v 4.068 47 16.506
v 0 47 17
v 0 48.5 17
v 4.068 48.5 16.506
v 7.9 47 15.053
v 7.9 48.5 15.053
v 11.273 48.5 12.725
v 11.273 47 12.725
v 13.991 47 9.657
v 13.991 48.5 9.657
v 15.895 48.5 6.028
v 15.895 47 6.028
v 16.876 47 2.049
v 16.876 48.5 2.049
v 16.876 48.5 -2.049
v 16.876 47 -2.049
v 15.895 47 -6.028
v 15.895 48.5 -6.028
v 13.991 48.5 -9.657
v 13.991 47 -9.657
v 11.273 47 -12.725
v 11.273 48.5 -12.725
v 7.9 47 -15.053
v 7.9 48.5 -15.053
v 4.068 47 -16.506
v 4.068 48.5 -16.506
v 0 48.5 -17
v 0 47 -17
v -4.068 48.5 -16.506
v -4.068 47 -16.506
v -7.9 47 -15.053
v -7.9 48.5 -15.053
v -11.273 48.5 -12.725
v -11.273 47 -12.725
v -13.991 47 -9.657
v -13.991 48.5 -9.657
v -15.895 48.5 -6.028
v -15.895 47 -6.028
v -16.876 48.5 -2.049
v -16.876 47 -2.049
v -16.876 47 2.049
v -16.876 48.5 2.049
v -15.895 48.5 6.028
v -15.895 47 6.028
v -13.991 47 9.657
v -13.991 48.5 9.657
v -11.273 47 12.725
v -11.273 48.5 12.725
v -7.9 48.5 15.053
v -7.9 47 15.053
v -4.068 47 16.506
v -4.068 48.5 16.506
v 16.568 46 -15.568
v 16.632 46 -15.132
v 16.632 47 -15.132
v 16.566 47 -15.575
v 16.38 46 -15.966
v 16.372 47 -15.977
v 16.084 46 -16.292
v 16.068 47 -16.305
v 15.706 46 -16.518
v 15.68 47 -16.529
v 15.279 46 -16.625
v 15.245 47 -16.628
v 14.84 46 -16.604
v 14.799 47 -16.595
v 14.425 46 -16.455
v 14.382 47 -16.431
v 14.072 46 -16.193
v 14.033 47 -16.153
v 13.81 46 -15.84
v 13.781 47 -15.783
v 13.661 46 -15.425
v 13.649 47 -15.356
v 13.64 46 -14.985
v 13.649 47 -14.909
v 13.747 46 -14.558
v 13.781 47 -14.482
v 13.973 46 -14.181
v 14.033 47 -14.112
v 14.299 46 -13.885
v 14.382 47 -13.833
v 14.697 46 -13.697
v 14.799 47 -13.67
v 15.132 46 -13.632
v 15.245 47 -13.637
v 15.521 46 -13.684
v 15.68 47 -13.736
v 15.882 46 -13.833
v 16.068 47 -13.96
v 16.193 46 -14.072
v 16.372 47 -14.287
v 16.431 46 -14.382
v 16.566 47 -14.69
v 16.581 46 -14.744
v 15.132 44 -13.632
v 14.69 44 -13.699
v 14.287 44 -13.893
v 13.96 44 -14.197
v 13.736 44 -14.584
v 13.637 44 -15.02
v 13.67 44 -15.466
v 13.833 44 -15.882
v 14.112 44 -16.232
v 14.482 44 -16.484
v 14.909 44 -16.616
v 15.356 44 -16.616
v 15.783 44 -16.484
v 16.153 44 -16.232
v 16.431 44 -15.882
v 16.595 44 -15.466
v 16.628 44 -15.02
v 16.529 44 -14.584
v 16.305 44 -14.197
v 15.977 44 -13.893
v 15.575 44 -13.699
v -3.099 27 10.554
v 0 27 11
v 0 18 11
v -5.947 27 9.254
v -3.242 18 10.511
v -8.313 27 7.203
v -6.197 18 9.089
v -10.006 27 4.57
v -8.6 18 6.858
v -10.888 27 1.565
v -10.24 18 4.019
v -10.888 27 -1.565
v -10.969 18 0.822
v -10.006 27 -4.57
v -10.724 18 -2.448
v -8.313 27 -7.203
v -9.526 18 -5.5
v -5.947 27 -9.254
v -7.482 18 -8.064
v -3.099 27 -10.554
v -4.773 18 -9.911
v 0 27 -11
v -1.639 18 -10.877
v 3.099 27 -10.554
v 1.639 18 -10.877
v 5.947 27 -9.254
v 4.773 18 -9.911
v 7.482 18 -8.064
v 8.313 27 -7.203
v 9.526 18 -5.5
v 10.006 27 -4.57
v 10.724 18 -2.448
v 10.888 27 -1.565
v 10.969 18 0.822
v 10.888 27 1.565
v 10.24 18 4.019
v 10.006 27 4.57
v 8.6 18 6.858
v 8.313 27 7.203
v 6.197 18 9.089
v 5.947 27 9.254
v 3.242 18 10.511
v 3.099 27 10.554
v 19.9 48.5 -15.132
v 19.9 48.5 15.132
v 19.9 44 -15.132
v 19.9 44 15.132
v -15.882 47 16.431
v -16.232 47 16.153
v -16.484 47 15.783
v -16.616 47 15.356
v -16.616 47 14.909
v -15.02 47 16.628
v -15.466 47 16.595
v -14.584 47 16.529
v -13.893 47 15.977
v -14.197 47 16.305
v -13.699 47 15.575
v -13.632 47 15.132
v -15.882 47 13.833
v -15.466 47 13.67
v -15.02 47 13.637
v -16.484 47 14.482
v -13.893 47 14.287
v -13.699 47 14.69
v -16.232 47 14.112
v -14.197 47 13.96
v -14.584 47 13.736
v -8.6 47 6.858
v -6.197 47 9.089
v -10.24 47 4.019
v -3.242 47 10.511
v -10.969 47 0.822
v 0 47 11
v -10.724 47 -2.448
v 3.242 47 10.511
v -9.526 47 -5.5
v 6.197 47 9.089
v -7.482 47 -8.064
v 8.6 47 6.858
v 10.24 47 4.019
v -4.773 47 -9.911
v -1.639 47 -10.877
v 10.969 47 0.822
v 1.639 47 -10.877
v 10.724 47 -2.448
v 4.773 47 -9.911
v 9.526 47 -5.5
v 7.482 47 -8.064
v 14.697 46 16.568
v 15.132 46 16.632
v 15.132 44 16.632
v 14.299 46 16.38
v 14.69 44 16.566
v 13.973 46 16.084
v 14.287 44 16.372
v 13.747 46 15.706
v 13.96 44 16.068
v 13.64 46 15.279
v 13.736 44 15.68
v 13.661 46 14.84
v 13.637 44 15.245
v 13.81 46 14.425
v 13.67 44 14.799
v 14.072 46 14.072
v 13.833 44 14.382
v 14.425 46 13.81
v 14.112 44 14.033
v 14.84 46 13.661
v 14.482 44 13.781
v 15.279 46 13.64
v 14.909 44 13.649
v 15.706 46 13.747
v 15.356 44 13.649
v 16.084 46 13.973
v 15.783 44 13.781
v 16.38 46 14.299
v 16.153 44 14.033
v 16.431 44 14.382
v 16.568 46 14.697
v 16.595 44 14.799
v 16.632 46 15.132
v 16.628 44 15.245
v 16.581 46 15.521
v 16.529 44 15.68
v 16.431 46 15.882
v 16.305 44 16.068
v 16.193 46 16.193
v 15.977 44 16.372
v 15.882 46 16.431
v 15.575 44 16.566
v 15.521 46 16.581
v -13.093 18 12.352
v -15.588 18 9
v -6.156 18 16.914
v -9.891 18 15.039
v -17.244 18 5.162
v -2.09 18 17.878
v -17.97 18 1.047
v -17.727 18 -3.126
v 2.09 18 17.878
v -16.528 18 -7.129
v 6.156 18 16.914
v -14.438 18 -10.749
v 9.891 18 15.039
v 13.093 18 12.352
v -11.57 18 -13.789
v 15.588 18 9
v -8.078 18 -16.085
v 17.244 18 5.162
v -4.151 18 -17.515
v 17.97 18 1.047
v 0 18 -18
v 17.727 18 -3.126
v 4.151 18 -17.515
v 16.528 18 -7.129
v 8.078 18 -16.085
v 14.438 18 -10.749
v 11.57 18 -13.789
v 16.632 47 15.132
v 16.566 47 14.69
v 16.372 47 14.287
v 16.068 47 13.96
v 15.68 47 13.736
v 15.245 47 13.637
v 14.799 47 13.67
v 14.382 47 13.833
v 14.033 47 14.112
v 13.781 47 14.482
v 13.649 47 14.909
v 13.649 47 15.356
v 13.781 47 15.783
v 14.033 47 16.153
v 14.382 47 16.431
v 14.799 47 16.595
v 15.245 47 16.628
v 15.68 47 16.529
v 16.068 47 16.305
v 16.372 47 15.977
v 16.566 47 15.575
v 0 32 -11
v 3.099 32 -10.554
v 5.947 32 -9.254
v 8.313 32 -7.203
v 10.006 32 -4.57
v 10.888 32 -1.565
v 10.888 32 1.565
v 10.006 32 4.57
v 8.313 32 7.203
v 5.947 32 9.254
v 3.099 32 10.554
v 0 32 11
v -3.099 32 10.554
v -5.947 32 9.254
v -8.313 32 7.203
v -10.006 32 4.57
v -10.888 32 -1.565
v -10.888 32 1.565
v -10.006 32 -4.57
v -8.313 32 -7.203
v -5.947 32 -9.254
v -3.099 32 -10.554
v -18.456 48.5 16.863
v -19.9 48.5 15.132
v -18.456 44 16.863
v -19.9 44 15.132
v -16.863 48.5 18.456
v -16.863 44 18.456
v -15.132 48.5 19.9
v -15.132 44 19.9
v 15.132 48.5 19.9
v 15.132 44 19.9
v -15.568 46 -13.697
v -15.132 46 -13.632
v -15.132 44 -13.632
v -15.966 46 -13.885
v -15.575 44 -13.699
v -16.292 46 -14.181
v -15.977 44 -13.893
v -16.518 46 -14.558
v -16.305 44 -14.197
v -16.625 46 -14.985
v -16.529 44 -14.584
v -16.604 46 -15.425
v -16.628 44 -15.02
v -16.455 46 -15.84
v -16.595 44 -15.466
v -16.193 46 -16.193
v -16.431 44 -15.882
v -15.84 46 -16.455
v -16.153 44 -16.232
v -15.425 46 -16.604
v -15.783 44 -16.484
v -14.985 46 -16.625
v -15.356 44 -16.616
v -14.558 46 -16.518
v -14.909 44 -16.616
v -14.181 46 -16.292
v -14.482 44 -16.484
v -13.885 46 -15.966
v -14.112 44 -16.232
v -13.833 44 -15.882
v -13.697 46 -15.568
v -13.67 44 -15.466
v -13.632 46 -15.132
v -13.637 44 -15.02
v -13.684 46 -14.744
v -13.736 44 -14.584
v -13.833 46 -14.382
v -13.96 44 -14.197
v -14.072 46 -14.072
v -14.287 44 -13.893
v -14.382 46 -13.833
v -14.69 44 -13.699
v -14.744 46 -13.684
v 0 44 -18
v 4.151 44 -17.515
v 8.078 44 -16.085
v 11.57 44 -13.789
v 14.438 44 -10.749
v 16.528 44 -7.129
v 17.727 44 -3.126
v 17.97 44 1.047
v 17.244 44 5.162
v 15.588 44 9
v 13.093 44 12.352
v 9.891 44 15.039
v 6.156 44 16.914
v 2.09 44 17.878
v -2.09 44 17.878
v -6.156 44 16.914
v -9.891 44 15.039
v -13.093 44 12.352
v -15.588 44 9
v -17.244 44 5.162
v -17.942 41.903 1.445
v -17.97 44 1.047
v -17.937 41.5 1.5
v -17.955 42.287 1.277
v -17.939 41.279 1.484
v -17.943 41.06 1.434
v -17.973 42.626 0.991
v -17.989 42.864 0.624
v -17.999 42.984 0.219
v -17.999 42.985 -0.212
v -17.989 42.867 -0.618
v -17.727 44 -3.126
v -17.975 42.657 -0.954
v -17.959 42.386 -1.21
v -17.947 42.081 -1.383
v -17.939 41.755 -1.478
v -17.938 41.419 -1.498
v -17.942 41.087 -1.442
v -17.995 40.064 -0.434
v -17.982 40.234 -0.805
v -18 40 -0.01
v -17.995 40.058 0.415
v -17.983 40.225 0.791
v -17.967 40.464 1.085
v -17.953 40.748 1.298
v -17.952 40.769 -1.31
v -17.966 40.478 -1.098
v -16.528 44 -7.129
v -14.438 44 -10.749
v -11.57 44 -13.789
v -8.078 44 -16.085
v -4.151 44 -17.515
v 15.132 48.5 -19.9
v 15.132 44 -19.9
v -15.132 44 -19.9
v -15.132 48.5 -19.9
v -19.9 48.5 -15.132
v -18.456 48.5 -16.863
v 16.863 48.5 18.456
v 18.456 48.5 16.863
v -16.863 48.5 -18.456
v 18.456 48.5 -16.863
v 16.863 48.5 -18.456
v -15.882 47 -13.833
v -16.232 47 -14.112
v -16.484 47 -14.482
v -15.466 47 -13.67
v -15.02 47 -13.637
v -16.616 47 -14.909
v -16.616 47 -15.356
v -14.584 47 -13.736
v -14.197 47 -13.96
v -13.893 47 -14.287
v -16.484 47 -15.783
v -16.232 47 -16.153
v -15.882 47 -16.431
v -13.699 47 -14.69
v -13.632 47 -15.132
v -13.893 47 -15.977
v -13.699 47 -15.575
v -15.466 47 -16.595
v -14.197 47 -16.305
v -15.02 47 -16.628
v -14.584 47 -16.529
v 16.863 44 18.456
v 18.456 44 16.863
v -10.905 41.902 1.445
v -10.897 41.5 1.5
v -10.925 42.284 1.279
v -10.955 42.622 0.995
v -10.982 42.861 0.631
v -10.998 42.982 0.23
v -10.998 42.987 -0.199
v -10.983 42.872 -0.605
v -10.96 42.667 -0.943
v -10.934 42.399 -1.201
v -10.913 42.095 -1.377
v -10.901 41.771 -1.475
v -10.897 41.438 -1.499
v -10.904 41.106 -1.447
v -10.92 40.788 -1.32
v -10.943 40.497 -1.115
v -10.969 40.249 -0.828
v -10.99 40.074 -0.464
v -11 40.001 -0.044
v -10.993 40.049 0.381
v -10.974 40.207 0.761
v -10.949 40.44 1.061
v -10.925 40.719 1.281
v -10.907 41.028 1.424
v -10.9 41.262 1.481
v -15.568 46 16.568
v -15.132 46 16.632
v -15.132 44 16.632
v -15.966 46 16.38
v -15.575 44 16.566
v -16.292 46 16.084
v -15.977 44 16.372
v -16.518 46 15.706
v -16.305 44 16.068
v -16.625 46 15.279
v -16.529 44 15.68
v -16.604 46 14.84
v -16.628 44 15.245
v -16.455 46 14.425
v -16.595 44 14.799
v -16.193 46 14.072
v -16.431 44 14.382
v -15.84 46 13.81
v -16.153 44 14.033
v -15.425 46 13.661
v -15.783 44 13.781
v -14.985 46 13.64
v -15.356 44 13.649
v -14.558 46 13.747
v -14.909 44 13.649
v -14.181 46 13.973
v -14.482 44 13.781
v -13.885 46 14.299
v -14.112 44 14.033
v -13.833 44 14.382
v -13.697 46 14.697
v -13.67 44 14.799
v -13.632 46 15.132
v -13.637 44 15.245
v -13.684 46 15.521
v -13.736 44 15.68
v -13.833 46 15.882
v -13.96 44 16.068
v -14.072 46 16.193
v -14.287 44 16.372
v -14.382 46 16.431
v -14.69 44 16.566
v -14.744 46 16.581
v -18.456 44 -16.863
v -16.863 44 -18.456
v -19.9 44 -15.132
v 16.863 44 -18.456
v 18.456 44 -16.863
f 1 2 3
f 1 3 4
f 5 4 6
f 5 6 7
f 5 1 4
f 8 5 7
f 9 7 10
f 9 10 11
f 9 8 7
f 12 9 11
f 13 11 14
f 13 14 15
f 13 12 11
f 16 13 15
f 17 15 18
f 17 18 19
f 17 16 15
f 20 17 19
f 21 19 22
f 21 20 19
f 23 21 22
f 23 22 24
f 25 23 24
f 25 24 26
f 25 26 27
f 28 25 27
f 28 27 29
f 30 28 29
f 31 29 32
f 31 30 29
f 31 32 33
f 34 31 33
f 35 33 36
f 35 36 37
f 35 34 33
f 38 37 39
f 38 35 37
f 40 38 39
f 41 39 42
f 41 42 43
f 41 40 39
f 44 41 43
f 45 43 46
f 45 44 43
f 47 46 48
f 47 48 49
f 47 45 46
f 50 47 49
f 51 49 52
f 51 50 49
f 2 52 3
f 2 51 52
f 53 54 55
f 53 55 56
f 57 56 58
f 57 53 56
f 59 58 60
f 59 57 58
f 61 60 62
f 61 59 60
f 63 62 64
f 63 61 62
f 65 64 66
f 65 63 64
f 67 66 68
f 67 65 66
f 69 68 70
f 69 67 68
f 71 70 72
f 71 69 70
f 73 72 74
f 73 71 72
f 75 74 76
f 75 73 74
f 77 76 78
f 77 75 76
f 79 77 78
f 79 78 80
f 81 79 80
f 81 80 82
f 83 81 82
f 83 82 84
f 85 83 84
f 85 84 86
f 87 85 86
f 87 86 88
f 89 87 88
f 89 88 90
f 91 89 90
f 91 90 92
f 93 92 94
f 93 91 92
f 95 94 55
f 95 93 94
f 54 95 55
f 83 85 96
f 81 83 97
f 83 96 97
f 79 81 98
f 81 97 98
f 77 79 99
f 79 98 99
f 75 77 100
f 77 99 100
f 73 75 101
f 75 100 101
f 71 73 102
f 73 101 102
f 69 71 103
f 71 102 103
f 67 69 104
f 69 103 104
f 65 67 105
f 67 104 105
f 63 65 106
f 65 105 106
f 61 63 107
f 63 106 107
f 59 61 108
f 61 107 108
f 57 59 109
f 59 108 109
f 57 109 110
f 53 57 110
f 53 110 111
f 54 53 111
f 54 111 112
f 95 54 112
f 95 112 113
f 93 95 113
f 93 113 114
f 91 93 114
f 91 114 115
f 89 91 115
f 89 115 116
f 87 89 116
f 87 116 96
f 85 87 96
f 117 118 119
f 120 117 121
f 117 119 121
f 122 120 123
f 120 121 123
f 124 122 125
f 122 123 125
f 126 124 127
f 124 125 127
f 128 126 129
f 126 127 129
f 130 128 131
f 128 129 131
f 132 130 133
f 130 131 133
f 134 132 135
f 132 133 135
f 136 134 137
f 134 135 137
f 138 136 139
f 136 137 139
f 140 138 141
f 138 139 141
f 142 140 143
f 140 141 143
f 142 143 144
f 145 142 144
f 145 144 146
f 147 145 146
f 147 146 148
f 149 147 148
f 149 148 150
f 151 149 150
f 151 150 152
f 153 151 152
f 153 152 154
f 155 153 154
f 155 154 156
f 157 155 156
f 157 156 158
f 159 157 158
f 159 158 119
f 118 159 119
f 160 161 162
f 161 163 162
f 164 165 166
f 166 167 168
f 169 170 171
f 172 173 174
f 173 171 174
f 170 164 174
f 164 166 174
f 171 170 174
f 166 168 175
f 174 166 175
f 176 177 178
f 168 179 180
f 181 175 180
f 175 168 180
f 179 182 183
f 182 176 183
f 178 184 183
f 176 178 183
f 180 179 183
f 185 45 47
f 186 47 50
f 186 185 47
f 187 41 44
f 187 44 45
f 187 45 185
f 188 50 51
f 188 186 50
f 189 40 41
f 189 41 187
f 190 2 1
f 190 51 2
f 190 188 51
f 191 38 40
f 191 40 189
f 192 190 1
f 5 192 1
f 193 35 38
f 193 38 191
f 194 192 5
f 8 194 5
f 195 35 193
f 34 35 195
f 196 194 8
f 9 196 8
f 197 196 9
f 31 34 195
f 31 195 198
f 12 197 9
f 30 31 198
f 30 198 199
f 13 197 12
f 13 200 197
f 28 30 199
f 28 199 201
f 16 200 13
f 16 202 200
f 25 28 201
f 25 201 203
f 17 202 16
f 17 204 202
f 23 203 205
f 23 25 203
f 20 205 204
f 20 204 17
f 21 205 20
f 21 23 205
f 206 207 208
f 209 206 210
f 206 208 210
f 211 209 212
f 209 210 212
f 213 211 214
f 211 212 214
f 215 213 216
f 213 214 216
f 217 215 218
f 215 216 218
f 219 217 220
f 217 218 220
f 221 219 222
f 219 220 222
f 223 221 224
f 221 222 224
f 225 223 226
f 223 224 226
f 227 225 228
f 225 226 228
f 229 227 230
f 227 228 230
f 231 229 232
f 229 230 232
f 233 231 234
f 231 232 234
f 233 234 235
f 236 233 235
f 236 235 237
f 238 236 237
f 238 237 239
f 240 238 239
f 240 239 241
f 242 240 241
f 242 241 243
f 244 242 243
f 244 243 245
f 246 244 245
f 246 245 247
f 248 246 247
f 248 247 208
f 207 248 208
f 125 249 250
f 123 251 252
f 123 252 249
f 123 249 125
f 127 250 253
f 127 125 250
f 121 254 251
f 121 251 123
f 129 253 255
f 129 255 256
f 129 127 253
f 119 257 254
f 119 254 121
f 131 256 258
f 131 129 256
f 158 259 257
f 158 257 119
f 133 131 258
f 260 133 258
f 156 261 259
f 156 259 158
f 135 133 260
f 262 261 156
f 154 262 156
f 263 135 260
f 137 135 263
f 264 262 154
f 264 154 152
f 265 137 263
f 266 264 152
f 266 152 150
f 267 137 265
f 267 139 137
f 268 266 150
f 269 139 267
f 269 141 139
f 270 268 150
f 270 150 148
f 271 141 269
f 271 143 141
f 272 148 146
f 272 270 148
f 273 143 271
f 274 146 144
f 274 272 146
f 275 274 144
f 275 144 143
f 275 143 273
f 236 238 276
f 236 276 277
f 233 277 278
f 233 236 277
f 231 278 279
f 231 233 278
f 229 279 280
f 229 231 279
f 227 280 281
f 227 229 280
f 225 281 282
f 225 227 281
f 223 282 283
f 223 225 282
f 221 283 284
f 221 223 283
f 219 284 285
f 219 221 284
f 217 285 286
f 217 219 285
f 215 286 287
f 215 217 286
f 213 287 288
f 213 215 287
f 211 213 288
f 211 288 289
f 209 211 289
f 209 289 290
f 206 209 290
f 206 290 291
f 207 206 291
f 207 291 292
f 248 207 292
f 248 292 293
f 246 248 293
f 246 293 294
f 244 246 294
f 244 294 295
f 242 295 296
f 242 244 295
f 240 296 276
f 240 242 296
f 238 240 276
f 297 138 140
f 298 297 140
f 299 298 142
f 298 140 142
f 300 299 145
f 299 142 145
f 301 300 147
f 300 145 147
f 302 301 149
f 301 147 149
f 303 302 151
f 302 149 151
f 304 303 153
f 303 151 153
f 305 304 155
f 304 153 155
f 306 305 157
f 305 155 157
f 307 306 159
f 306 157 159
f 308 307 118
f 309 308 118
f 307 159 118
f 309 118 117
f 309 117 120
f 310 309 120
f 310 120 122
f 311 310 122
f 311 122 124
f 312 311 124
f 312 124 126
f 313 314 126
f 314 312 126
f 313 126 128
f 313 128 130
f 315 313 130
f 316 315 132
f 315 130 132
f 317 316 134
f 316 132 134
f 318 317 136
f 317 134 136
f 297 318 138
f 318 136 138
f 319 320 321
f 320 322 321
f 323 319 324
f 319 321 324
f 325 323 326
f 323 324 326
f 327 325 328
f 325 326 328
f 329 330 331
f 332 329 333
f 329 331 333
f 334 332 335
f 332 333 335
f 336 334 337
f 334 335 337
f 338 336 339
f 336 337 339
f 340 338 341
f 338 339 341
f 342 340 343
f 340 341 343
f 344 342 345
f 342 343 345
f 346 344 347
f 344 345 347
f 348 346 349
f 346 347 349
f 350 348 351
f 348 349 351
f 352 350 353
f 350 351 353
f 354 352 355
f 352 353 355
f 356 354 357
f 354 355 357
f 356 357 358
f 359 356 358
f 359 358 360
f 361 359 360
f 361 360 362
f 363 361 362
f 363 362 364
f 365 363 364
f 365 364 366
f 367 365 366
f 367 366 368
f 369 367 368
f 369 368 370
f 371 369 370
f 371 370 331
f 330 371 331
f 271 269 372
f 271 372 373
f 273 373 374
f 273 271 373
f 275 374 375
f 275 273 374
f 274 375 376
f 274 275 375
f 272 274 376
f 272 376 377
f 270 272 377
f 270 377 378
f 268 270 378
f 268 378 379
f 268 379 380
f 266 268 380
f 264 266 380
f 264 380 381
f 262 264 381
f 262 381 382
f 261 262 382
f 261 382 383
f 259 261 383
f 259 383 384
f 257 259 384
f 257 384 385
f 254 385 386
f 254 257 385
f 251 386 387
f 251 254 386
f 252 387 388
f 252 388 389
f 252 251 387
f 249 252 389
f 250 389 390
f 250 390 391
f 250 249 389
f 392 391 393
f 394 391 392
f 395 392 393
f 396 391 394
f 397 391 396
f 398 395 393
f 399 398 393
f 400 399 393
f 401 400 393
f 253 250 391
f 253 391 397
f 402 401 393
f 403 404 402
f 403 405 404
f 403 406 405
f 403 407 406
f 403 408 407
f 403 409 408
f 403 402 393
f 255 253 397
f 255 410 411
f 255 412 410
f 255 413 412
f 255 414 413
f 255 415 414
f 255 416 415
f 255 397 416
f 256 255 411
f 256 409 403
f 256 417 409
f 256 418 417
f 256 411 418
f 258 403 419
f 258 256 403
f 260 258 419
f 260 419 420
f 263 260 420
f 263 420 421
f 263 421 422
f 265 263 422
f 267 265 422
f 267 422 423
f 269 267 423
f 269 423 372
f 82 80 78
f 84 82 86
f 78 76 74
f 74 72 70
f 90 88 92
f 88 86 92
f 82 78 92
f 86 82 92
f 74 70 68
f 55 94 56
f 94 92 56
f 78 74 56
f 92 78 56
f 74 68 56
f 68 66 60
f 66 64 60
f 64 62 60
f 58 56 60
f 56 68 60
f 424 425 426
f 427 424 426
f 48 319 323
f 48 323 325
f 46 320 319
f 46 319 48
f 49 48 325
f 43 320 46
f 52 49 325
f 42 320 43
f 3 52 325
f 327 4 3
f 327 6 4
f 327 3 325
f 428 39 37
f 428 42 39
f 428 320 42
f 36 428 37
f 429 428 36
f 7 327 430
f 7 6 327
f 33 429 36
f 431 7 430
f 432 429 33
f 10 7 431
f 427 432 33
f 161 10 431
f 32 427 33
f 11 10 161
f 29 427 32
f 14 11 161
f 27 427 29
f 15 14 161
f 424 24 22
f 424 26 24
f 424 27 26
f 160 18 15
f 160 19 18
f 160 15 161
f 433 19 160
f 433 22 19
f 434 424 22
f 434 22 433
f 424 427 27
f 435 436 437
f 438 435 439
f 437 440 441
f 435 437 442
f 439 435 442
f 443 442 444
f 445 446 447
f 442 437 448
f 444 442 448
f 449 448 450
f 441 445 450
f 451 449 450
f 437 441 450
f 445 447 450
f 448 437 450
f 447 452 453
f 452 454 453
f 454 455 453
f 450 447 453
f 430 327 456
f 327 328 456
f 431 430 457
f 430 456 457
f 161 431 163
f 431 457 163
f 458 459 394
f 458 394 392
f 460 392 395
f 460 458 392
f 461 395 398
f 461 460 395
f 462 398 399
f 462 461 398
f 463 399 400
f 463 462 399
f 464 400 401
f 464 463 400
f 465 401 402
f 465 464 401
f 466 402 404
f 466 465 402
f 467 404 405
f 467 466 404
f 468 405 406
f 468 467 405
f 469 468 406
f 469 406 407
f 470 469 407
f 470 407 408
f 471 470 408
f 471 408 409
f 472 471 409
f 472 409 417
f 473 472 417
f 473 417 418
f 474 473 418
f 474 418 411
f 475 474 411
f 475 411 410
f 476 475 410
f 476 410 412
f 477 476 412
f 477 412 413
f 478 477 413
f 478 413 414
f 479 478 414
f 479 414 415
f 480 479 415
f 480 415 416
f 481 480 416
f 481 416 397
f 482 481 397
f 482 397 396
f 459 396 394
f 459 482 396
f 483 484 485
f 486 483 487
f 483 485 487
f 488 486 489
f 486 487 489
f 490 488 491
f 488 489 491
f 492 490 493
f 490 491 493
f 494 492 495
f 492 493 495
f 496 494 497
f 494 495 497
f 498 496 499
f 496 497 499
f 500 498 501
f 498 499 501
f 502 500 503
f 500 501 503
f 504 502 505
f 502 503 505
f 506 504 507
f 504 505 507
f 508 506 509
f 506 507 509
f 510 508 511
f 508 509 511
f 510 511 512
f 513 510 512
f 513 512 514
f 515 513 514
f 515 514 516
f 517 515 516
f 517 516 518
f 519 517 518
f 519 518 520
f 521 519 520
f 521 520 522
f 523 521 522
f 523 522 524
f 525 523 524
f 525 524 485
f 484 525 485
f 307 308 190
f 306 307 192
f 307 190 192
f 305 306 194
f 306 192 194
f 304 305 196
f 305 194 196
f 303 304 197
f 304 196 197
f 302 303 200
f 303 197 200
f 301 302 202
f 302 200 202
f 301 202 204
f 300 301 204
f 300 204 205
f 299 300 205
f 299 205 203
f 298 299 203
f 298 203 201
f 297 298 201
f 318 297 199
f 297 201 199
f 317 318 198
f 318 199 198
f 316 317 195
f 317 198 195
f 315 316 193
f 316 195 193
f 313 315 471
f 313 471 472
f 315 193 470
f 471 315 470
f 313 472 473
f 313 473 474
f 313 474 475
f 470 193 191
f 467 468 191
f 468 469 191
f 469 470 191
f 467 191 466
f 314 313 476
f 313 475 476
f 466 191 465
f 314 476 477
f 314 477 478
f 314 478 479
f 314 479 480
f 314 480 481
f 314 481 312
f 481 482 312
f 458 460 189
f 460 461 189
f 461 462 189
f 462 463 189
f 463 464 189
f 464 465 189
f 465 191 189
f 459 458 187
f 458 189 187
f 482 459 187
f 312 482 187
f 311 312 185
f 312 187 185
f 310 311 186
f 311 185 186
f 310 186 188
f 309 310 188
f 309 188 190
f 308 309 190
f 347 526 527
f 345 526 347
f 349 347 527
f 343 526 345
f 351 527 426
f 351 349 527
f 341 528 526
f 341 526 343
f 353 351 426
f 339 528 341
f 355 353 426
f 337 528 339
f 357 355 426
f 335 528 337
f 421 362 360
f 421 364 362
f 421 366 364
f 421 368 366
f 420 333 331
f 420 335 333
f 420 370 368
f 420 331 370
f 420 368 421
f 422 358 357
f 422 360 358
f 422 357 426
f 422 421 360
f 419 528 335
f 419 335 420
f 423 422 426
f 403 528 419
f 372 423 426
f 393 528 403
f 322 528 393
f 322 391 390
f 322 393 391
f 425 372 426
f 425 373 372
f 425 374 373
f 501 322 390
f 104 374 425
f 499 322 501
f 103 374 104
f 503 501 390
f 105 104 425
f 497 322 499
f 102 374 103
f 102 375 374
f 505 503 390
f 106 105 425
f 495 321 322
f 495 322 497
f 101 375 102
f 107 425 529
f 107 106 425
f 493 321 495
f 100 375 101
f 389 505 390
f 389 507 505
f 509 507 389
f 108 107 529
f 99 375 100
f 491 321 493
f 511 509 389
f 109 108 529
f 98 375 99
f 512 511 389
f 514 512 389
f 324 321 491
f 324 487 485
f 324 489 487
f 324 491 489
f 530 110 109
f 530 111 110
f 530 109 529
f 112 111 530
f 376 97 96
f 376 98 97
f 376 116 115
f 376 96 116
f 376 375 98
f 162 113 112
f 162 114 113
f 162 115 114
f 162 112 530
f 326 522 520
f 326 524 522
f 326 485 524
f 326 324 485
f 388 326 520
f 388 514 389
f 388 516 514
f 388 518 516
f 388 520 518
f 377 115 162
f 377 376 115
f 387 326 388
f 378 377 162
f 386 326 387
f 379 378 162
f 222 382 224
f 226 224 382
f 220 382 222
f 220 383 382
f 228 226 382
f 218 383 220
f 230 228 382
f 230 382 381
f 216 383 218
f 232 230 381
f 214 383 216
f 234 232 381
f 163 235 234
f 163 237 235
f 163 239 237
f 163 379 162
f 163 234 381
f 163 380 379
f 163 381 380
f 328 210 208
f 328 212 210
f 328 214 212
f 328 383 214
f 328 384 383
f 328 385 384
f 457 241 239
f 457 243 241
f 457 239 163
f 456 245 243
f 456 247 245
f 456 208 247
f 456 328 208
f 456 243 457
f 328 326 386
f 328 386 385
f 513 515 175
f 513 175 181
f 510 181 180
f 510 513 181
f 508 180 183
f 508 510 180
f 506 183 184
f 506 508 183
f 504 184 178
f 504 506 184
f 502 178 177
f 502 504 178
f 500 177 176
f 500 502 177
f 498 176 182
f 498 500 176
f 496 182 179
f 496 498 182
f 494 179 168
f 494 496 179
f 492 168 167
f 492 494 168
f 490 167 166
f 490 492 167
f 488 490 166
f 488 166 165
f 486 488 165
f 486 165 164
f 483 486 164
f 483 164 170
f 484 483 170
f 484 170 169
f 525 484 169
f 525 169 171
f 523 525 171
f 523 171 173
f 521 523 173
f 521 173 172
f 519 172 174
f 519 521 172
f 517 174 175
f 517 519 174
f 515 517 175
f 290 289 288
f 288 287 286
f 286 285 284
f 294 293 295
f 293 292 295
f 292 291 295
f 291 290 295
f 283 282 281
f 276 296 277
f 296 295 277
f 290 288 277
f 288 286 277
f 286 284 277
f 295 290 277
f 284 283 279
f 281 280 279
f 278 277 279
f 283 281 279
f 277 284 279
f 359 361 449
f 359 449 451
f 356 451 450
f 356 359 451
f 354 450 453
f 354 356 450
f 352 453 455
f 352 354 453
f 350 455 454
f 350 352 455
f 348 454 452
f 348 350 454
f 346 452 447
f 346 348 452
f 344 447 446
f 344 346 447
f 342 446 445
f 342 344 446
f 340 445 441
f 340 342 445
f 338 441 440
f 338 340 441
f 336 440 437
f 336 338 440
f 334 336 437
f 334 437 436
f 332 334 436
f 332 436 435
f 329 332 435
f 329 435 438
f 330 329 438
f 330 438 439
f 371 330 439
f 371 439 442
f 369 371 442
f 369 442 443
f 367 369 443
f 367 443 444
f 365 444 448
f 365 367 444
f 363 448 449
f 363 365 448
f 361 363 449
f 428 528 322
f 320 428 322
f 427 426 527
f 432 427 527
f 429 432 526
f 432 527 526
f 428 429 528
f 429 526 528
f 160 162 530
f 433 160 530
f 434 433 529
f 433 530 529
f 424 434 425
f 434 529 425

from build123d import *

# Parameters (mm, degrees)
SKETCH1_R              = 25
BOSS_EXTRUDE1_DEPTH    = 50
SKETCH2_R              = 25
SKETCH2_R_2            = 18
CUT_EXTRUDE1_DEPTH     = 46
CUT_EXTRUDE2_START     = -4
CUT_EXTRUDE2_OUTLINE_R = 1.5
CUT_EXTRUDE2_DEPTH     = 4
SKETCH6_R              = 6.5
CUT_EXTRUDE5_DEPTH     = 5
SKETCH8_R              = 11
CUT_EXTRUDE6_DEPTH     = 13
SKETCH9_R              = 11
CUT_EXTRUDE7_DEPTH     = 5
SKETCH10_R             = 4
CUT_EXTRUDE8_DEPTH     = 58.37612744
SKETCH11_R             = 11
SKETCH11_R_2           = 4
CUT_EXTRUDE9_DEPTH     = 27
SKETCH13_R             = 18
SKETCH13_R_2           = 11
CUT_EXTRUDE10_DEPTH    = 18
CUT_EXTRUDE13_START    = -3
CUT_EXTRUDE13_DEPTH    = 3
BOSS_EXTRUDE4_START    = 2
SKETCH19_R             = 1.5
SKETCH19_R_2           = 18
BOSS_EXTRUDE4_DEPTH    = 2
F_3DSKETCH11_R         = 1.5
CUT_EXTRUDE14_DEPTH    = 19.9
SKETCH20_R             = 11
CUT_EXTRUDE15_DEPTH    = 5
SKETCH21_R             = 17
BOSS_EXTRUDE5_DEPTH    = 1.5


with BuildPart() as part:
    # Sketch1 → Boss-Extrude1 (new body)
    with BuildSketch(Plane(origin=(0, 0, 0), x_dir=(1, 0, 0), z_dir=(0, 1, 0))):
        with Locations(Location((0, 0, 0), (0, 0, 270))):
            Circle(SKETCH1_R)
    extrude(amount=BOSS_EXTRUDE1_DEPTH)

    # Sketch2 → Cut-Extrude1 (cut)
    with BuildSketch(Plane.XZ):
        with Locations(Location((0, 0, 0), (0, 0, 90))):
            Circle(SKETCH2_R)
        with Locations(Location((0, 0, 0), (0, 0, 270))):
            Circle(SKETCH2_R_2, mode=Mode.SUBTRACT)
    extrude(amount=-CUT_EXTRUDE1_DEPTH, mode=Mode.SUBTRACT)

    # Cut-Extrude2: read off the stored shape, not the designer's step
    # Cut-Extrude2 outline → Cut-Extrude2 (cut)
    with BuildSketch(Plane(origin=(0, 50, 0), x_dir=(1, 0, 0), z_dir=(0, 1, 0)).offset(CUT_EXTRUDE2_START)):
        with BuildLine():
            ThreePointArc((-15.132415538, -19.9), (0, -25), (15.132415538, -19.9))
            Line((15.132415538, -19.9), (-15.132415538, -19.9))
        make_face()
        with BuildLine():
            Line((19.9, 15.132415538), (19.9, -15.132415538))
            ThreePointArc((19.9, -15.132415538), (25, 0), (19.9, 15.132415538))
        make_face()
        with BuildLine():
            ThreePointArc((-19.9, 15.132415538), (-25, 0), (-19.9, -15.132415538))
            Line((-19.9, -15.132415538), (-19.9, 15.132415538))
        make_face()
        with BuildLine():
            Line((-15.132415538, 19.9), (15.132415538, 19.9))
            ThreePointArc((15.132415538, 19.9), (0, 25), (-15.132415538, 19.9))
        make_face()
        with Locations((-15.132415538, -15.132415538)):
            Circle(CUT_EXTRUDE2_OUTLINE_R)
        with Locations((15.132415538, -15.132415538)):
            Circle(CUT_EXTRUDE2_OUTLINE_R)
        with Locations((-15.132415538, 15.132415538)):
            Circle(CUT_EXTRUDE2_OUTLINE_R)
        with Locations((15.132415538, 15.132415538)):
            Circle(CUT_EXTRUDE2_OUTLINE_R)
    extrude(amount=CUT_EXTRUDE2_DEPTH, mode=Mode.SUBTRACT)

    # Sketch6 → Cut-Extrude5 (cut)
    with BuildSketch(Plane(origin=(0, 50, 0), x_dir=(1, 0, 0), z_dir=(0, 1, 0))):
        with Locations(Location((0, 0, 0), (0, 0, 270))):
            Circle(SKETCH6_R)
    extrude(amount=-CUT_EXTRUDE5_DEPTH, mode=Mode.SUBTRACT)

    # Sketch8 → Cut-Extrude6 (cut)
    with BuildSketch(Plane(origin=(0, 45, 0), x_dir=(1, 0, 0), z_dir=(0, 1, 0))):
        with Locations(Location((0, 0, 0), (0, 0, 270))):
            Circle(SKETCH8_R)
    extrude(amount=-CUT_EXTRUDE6_DEPTH, mode=Mode.SUBTRACT)

    # Sketch9 → Cut-Extrude7 (cut)
    with BuildSketch(Plane(origin=(0, 50, 0), x_dir=(1, 0, 0), z_dir=(0, 1, 0))):
        with Locations(Location((0, 0, 0), (0, 0, 270))):
            Circle(SKETCH9_R)
    extrude(amount=-CUT_EXTRUDE7_DEPTH, mode=Mode.SUBTRACT)

    # Sketch10 → Cut-Extrude8 (cut, through all)
    with BuildSketch(Plane.XZ):
        with Locations(Location((0, 0, 0), (0, 0, 270))):
            Circle(SKETCH10_R)
    extrude(amount=-CUT_EXTRUDE8_DEPTH, mode=Mode.SUBTRACT)

    # Sketch11 → Cut-Extrude9 (cut)
    with BuildSketch(Plane.XZ):
        with Locations(Location((0, 0, 0), (0, 0, 90))):
            Circle(SKETCH11_R)
        with Locations(Location((0, 0, 0), (0, 0, 270))):
            Circle(SKETCH11_R_2, mode=Mode.SUBTRACT)
    extrude(amount=-CUT_EXTRUDE9_DEPTH, mode=Mode.SUBTRACT)

    # Sketch13 → Cut-Extrude10 (cut)
    with BuildSketch(Plane.XZ):
        with Locations(Location((0, 0, 0), (0, 0, 270))):
            Circle(SKETCH13_R)
        with Locations(Location((0, 0, 0), (0, 0, 270))):
            Circle(SKETCH13_R_2, mode=Mode.SUBTRACT)
    extrude(amount=-CUT_EXTRUDE10_DEPTH, mode=Mode.SUBTRACT)

    # Sketch18 → Cut-Extrude13 (cut)
    with BuildSketch(Plane(origin=(0, 50, 0), x_dir=(1, 0, 0), z_dir=(0, 1, 0)).offset(CUT_EXTRUDE13_START)):
        with BuildLine():
            Line((-19.9, 15.132415538), (-19.9, -15.132415538))
            ThreePointArc((-19.9, -15.132415538), (-17.67766953, -17.67766953), (-15.132415538, -19.9))
            Line((-15.132415538, -19.9), (15.132415538, -19.9))
            ThreePointArc((15.132415538, -19.9), (17.67766953, -17.67766953), (19.9, -15.132415538))
            Line((19.9, -15.132415538), (19.9, 15.132415538))
            ThreePointArc((19.9, 15.132415538), (17.67766953, 17.67766953), (15.132415538, 19.9))
            Line((15.132415538, 19.9), (-15.132415538, 19.9))
            ThreePointArc((-15.132415538, 19.9), (-17.67766953, 17.67766953), (-19.9, 15.132415538))
        make_face()
    extrude(amount=CUT_EXTRUDE13_DEPTH, mode=Mode.SUBTRACT)

    # Sketch19 → Boss-Extrude4 (add)
    with BuildSketch(Plane.XZ.offset(-46).offset(BOSS_EXTRUDE4_START)):
        with BuildLine():
            ThreePointArc((-15.132415538, 19.9), (-17.67766953, 17.67766953), (-19.9, 15.132415538))
            Line((-19.9, 15.132415538), (-19.9, -15.132415538))
            ThreePointArc((-19.9, -15.132415538), (-17.67766953, -17.67766953), (-15.132415538, -19.9))
            Line((-15.132415538, -19.9), (15.132415538, -19.9))
            ThreePointArc((15.132415538, -19.9), (17.67766953, -17.67766953), (19.9, -15.132415538))
            Line((19.9, -15.132415538), (19.9, 15.132415538))
            ThreePointArc((19.9, 15.132415538), (17.67766953, 17.67766953), (15.132415538, 19.9))
            Line((15.132415538, 19.9), (-15.132415538, 19.9))
        make_face()
        with Locations(Location((-15.132415538, -15.132415538, 0), (0, 0, 90))):
            Circle(SKETCH19_R, mode=Mode.SUBTRACT)
        with Locations(Location((-15.132415538, 15.132415538, 0), (0, 0, 90))):
            Circle(SKETCH19_R, mode=Mode.SUBTRACT)
        with Locations(Location((0, 0, 0), (0, 0, 270))):
            Circle(SKETCH19_R_2, mode=Mode.SUBTRACT)
        with Locations(Location((15.132415538, 15.132415538, 0), (0, 0, 90))):
            Circle(SKETCH19_R, mode=Mode.SUBTRACT)
        with Locations(Location((15.132415538, -15.132415538, 0), (0, 0, 90))):
            Circle(SKETCH19_R, mode=Mode.SUBTRACT)
    extrude(amount=-BOSS_EXTRUDE4_DEPTH)

    # 3DSketch11 → Cut-Extrude14 (cut)
    with BuildSketch(Plane(origin=(0, 44, 0), x_dir=(0, -1, 0), z_dir=(-1, 0, 0))):
        with Locations(Location((2.5, 0, 0), (0, 0, 90))):
            Circle(F_3DSKETCH11_R)
    extrude(amount=CUT_EXTRUDE14_DEPTH, mode=Mode.SUBTRACT)

    # Sketch20 → Cut-Extrude15 (cut)
    with BuildSketch(Plane.XZ.offset(-27)):
        with Locations(Location((0, 0, 0), (0, 0, 270))):
            Circle(SKETCH20_R)
    extrude(amount=-CUT_EXTRUDE15_DEPTH, mode=Mode.SUBTRACT)

    # Sketch21 → Boss-Extrude5 (add)
    with BuildSketch(Plane(origin=(0, 47, 0), x_dir=(1, 0, 0), z_dir=(0, 1, 0))):
        with BuildLine():
            Line((-19.9, 15.132415538), (-19.9, -15.132415538))
            ThreePointArc((-19.9, -15.132415538), (-17.67766953, -17.67766953), (-15.132415538, -19.9))
            Line((-15.132415538, -19.9), (15.132415538, -19.9))
            ThreePointArc((15.132415538, -19.9), (17.67766953, -17.67766953), (19.9, -15.132415538))
            Line((19.9, -15.132415538), (19.9, 15.132415538))
            ThreePointArc((19.9, 15.132415538), (17.67766953, 17.67766953), (15.132415538, 19.9))
            Line((15.132415538, 19.9), (-15.132415538, 19.9))
            ThreePointArc((-15.132415538, 19.9), (-17.67766953, 17.67766953), (-19.9, 15.132415538))
        make_face()
        with Locations(Location((0, 0, 0), (0, 0, 270))):
            Circle(SKETCH21_R, mode=Mode.SUBTRACT)
    extrude(amount=BOSS_EXTRUDE5_DEPTH)


solid = part.part
